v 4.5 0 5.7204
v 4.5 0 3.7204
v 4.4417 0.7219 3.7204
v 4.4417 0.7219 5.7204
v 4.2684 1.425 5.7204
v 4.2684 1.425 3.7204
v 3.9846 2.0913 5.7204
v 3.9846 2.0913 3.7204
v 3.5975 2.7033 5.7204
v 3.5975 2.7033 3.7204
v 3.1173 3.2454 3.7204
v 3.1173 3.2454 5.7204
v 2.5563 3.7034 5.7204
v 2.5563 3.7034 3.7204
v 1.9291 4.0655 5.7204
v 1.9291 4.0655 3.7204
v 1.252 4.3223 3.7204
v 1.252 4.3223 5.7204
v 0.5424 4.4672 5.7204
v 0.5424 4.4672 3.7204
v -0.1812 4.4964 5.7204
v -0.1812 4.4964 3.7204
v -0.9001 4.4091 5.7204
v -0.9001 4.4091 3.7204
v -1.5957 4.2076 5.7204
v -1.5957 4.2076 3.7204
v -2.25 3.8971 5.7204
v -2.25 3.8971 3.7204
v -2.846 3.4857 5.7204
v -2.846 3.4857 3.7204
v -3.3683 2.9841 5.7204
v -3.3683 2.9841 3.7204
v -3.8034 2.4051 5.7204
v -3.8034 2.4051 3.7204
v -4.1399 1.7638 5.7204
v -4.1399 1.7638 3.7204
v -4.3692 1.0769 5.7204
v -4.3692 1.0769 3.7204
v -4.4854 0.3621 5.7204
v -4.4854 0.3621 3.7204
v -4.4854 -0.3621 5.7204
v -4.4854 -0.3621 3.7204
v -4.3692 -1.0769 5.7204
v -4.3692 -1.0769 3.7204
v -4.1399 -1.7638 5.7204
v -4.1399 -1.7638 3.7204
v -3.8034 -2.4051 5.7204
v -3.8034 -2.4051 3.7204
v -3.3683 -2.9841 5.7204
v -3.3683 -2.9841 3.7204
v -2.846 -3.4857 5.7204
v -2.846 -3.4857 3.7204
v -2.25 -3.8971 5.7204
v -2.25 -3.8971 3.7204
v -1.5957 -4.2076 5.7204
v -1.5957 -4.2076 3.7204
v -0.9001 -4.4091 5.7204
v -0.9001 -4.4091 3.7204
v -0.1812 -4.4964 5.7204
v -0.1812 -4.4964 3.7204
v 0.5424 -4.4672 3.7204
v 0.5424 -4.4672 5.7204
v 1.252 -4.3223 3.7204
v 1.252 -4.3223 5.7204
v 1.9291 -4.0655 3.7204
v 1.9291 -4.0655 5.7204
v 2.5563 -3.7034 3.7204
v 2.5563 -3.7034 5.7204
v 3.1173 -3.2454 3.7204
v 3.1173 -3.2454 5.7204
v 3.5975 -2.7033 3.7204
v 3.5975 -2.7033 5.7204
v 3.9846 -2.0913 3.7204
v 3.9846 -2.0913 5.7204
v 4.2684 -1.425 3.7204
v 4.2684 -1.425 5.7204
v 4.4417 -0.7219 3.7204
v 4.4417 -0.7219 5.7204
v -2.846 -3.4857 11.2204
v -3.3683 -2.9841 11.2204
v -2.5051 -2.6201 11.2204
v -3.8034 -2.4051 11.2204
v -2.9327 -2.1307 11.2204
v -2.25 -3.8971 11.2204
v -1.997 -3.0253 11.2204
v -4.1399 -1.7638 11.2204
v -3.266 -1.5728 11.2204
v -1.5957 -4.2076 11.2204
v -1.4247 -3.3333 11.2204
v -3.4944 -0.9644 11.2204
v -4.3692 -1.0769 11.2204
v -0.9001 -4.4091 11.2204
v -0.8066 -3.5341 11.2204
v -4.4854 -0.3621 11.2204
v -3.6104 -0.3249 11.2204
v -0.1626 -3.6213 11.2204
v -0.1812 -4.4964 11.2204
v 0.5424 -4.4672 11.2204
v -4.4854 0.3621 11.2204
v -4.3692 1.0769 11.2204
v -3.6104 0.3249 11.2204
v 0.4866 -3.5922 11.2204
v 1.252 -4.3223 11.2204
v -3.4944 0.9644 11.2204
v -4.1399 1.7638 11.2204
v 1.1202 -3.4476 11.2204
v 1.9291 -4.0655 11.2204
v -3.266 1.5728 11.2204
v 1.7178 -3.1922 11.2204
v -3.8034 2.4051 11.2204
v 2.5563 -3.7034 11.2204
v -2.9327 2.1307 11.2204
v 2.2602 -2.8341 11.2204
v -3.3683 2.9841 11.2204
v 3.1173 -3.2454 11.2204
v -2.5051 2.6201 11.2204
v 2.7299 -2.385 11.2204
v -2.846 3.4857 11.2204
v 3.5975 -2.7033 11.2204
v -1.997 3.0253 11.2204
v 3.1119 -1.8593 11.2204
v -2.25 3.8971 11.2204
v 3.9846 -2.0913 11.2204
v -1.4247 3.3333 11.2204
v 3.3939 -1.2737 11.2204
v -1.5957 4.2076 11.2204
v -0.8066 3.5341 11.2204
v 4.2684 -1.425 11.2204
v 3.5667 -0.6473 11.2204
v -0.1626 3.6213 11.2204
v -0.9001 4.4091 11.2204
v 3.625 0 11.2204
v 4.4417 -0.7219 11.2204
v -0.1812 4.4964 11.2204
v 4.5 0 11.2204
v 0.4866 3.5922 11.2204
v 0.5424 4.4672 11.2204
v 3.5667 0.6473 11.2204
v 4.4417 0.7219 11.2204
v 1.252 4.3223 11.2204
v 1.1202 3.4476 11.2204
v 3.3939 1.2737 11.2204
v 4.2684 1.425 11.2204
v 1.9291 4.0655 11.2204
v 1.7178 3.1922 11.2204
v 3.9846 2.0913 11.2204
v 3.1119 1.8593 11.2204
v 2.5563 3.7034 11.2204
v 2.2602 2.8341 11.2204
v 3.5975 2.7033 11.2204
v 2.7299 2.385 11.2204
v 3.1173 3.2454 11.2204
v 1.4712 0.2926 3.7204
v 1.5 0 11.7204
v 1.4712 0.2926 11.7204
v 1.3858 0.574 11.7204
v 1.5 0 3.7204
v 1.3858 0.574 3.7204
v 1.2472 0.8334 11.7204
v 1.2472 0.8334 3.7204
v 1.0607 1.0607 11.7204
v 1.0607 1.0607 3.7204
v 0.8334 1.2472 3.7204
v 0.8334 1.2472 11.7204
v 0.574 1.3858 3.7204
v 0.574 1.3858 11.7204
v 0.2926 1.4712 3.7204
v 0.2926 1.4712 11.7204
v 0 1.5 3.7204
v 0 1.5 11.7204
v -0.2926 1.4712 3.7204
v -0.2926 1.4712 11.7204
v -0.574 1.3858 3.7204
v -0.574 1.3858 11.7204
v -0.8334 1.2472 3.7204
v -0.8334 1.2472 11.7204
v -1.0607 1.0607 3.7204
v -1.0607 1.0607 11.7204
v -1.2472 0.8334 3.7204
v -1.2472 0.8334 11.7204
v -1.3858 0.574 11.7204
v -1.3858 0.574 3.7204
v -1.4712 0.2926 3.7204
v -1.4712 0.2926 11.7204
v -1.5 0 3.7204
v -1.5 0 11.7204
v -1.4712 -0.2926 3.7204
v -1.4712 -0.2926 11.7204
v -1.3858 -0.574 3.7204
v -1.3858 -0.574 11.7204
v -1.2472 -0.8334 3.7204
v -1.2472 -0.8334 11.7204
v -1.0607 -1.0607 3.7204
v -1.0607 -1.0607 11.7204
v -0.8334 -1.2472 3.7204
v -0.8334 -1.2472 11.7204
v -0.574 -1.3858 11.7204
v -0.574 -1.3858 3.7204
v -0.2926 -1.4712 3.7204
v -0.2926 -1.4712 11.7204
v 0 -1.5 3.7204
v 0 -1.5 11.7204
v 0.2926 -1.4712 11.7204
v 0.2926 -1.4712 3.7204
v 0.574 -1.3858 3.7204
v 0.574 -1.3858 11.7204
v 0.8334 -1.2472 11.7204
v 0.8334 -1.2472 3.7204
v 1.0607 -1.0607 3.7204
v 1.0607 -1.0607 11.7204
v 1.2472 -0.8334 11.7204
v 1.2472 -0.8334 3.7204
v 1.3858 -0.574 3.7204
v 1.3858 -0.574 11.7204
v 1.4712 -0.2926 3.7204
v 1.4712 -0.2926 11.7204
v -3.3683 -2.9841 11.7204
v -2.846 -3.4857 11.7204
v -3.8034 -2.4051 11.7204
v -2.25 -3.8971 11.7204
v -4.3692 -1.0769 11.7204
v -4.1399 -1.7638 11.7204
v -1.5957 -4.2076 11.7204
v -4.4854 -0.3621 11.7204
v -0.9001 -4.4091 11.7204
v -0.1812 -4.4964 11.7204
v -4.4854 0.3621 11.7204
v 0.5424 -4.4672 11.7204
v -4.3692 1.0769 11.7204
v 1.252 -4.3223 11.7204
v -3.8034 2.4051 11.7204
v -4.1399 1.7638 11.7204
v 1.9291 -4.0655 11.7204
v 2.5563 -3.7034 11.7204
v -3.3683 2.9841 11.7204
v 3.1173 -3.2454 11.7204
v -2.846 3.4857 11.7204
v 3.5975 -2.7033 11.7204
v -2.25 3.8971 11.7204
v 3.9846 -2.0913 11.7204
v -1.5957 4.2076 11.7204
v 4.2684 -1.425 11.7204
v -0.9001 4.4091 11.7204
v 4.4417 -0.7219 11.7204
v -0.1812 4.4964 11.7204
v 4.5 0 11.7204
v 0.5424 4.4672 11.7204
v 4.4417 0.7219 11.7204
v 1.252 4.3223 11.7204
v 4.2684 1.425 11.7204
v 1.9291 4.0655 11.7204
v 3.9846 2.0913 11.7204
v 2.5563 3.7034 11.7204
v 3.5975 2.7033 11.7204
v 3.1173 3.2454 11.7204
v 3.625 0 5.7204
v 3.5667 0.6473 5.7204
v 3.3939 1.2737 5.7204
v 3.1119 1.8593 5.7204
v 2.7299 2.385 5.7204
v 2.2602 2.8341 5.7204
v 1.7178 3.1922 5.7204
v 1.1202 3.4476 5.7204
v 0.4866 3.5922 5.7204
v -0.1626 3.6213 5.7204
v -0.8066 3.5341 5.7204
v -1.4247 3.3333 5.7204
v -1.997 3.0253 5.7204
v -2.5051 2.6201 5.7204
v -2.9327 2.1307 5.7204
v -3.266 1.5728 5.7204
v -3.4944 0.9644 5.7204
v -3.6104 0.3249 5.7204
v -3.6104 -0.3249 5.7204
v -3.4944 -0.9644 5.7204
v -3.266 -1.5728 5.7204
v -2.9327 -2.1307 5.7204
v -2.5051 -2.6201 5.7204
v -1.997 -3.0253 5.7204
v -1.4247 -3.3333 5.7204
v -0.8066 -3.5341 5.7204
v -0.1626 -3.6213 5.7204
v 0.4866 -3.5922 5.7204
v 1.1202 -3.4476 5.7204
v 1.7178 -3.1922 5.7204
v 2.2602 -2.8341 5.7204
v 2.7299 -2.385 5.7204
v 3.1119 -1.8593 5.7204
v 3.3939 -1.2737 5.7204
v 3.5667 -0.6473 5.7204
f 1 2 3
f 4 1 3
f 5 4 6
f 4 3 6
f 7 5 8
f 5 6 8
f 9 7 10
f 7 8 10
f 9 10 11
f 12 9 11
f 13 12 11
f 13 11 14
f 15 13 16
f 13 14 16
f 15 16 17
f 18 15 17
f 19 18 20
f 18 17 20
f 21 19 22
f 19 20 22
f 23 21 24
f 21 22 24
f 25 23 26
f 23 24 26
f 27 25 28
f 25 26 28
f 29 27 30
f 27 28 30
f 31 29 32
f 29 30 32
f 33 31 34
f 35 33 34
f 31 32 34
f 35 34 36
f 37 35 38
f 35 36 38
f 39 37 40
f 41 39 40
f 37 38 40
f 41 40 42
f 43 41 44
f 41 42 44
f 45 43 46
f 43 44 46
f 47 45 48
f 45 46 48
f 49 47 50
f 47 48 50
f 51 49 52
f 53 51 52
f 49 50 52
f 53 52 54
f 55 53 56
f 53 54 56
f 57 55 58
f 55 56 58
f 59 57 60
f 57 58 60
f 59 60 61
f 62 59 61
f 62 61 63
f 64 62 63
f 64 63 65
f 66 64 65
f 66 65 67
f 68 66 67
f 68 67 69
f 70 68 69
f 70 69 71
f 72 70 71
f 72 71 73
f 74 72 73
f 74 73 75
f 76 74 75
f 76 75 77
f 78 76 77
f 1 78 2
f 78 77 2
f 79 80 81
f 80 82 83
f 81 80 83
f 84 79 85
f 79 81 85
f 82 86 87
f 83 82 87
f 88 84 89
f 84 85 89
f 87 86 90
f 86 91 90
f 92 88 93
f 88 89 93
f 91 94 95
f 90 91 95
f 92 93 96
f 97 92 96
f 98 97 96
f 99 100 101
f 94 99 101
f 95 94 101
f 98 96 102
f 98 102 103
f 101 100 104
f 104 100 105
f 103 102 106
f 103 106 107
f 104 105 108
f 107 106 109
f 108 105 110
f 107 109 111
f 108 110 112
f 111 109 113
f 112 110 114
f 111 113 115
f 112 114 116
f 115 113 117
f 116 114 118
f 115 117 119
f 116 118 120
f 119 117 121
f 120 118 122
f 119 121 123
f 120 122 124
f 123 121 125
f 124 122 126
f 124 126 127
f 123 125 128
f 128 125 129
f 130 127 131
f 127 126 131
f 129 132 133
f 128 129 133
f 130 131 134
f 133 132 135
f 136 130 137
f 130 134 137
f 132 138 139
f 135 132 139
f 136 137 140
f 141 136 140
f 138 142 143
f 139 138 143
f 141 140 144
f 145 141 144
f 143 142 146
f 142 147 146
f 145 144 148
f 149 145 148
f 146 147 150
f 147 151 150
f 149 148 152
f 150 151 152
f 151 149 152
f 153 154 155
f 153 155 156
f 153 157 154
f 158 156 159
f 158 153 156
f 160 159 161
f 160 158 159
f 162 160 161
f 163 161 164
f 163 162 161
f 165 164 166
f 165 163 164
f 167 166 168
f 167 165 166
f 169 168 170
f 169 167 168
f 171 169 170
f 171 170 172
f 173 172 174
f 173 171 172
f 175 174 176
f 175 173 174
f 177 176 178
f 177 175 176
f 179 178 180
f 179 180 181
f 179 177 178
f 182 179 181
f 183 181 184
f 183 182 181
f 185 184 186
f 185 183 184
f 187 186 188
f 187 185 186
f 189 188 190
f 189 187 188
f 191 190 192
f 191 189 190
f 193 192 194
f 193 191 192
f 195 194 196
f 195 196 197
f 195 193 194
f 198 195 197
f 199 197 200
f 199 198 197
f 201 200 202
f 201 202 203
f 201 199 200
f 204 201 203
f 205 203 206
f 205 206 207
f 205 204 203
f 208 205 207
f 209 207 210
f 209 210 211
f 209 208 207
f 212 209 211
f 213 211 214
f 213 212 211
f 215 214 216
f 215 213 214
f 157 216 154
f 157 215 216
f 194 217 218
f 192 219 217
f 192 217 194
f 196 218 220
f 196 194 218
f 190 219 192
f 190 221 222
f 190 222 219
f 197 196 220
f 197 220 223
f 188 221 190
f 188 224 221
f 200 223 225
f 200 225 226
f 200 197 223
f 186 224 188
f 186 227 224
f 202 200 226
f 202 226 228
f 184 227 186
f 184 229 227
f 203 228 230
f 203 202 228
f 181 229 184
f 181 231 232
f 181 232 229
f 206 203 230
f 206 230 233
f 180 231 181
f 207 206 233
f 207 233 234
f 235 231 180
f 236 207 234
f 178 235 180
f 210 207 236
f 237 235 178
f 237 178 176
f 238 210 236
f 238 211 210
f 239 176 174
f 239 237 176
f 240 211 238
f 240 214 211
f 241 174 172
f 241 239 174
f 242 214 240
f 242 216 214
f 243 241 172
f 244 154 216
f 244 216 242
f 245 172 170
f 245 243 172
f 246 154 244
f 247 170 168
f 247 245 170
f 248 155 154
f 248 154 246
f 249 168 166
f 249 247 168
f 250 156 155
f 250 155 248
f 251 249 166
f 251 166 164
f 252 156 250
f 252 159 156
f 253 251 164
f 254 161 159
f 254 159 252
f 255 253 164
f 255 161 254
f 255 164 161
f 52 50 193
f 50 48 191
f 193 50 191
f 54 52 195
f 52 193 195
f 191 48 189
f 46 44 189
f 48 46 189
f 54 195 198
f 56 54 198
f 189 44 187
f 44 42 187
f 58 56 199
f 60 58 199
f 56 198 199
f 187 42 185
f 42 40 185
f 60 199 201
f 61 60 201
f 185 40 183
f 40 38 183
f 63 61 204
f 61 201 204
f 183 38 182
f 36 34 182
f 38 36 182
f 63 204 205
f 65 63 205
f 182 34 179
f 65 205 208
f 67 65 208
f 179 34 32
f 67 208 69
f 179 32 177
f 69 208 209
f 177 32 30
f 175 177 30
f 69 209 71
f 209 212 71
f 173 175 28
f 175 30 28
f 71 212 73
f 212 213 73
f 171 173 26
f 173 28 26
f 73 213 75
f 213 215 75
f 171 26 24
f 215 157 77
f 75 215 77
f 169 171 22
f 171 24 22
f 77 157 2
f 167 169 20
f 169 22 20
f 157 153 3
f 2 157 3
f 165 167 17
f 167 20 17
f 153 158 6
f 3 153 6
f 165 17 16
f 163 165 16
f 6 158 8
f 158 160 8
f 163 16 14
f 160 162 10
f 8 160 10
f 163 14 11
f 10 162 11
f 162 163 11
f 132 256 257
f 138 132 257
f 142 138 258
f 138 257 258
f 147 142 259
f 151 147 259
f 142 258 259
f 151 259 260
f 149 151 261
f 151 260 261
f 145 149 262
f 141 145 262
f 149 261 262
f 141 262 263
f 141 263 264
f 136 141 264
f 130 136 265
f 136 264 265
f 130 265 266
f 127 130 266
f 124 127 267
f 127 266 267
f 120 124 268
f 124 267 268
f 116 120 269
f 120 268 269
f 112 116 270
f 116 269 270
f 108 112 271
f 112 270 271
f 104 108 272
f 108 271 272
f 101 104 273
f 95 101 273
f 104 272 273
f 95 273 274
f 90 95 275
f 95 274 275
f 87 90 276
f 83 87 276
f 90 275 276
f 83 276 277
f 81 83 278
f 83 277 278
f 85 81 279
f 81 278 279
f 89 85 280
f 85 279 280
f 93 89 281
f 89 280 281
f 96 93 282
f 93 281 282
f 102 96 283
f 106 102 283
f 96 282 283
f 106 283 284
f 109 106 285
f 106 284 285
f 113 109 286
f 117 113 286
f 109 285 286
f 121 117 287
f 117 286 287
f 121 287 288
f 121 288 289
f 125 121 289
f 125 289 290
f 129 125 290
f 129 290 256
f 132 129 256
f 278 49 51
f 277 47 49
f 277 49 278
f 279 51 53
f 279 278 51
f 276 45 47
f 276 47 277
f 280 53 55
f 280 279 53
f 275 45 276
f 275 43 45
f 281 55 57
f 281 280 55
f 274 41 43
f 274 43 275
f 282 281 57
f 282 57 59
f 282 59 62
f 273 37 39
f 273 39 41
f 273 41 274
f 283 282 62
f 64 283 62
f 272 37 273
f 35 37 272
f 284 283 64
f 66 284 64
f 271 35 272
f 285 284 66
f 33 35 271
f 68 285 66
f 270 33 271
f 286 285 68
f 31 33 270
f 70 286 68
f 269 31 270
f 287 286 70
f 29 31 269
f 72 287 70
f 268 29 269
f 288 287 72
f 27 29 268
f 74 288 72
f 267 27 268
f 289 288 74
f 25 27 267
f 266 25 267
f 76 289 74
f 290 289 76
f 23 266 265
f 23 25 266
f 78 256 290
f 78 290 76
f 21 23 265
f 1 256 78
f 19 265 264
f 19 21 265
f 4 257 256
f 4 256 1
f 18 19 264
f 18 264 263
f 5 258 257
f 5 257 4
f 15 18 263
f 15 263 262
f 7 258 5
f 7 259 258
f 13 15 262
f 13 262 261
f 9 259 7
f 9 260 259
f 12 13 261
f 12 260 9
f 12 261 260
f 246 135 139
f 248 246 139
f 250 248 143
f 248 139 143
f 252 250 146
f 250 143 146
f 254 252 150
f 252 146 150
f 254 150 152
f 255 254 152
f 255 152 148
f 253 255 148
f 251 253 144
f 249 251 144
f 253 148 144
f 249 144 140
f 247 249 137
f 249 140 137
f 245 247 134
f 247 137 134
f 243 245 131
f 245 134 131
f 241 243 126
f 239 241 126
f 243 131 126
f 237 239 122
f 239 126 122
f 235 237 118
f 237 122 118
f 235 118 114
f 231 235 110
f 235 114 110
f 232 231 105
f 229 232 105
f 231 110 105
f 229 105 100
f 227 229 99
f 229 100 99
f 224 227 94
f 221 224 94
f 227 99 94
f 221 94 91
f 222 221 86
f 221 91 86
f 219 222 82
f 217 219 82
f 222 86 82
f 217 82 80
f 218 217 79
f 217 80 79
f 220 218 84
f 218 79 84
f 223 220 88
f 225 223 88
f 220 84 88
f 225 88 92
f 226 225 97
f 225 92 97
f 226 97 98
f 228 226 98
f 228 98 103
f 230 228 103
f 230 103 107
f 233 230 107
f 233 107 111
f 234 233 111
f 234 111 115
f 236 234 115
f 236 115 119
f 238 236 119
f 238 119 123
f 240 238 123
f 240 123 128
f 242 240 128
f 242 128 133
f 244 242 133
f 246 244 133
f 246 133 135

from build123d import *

# Parameters (mm, degrees)
SKETCH1_R           = 9
SKETCH1_R_2         = 3
BOSS_EXTRUDE1_DEPTH = 4
SKETCH2_R           = 7.25
SKETCH2_R_2         = 3
BOSS_EXTRUDE2_DEPTH = 11
SKETCH3_R           = 9
SKETCH3_R_2         = 3
BOSS_EXTRUDE3_DEPTH = 1
ECHELLE1_SCALE      = 2
ECHELLE2_SCALE      = 0.25


with BuildPart() as part:
    # Sketch1 → Boss-Extrude1 (new body)
    with BuildSketch(Plane.XY):
        Circle(SKETCH1_R)
        Circle(SKETCH1_R_2, mode=Mode.SUBTRACT)
    extrude(amount=BOSS_EXTRUDE1_DEPTH)

    # Sketch2 → Boss-Extrude2 (add)
    with BuildSketch(Plane.XY.offset(4)):
        Circle(SKETCH2_R)
        Circle(SKETCH2_R_2, mode=Mode.SUBTRACT)
    extrude(amount=BOSS_EXTRUDE2_DEPTH)

    # Sketch3 → Boss-Extrude3 (add)
    with BuildSketch(Plane.XY.offset(15)):
        Circle(SKETCH3_R)
        Circle(SKETCH3_R_2, mode=Mode.SUBTRACT)
    extrude(amount=BOSS_EXTRUDE3_DEPTH)


with BuildPart() as part_1:
    # Echelle1: scaled about (0, 0, 7.44086542)
    add(part.part.scale(ECHELLE1_SCALE).moved(Location((0, 0, -7.44086542))))


with BuildPart() as part_2:
    # Echelle2: scaled about (0, 0, 7.440865421)
    add(part_1.part.scale(ECHELLE2_SCALE).moved(Location((0, 0, 5.580649066))))


solid = part_2.part
